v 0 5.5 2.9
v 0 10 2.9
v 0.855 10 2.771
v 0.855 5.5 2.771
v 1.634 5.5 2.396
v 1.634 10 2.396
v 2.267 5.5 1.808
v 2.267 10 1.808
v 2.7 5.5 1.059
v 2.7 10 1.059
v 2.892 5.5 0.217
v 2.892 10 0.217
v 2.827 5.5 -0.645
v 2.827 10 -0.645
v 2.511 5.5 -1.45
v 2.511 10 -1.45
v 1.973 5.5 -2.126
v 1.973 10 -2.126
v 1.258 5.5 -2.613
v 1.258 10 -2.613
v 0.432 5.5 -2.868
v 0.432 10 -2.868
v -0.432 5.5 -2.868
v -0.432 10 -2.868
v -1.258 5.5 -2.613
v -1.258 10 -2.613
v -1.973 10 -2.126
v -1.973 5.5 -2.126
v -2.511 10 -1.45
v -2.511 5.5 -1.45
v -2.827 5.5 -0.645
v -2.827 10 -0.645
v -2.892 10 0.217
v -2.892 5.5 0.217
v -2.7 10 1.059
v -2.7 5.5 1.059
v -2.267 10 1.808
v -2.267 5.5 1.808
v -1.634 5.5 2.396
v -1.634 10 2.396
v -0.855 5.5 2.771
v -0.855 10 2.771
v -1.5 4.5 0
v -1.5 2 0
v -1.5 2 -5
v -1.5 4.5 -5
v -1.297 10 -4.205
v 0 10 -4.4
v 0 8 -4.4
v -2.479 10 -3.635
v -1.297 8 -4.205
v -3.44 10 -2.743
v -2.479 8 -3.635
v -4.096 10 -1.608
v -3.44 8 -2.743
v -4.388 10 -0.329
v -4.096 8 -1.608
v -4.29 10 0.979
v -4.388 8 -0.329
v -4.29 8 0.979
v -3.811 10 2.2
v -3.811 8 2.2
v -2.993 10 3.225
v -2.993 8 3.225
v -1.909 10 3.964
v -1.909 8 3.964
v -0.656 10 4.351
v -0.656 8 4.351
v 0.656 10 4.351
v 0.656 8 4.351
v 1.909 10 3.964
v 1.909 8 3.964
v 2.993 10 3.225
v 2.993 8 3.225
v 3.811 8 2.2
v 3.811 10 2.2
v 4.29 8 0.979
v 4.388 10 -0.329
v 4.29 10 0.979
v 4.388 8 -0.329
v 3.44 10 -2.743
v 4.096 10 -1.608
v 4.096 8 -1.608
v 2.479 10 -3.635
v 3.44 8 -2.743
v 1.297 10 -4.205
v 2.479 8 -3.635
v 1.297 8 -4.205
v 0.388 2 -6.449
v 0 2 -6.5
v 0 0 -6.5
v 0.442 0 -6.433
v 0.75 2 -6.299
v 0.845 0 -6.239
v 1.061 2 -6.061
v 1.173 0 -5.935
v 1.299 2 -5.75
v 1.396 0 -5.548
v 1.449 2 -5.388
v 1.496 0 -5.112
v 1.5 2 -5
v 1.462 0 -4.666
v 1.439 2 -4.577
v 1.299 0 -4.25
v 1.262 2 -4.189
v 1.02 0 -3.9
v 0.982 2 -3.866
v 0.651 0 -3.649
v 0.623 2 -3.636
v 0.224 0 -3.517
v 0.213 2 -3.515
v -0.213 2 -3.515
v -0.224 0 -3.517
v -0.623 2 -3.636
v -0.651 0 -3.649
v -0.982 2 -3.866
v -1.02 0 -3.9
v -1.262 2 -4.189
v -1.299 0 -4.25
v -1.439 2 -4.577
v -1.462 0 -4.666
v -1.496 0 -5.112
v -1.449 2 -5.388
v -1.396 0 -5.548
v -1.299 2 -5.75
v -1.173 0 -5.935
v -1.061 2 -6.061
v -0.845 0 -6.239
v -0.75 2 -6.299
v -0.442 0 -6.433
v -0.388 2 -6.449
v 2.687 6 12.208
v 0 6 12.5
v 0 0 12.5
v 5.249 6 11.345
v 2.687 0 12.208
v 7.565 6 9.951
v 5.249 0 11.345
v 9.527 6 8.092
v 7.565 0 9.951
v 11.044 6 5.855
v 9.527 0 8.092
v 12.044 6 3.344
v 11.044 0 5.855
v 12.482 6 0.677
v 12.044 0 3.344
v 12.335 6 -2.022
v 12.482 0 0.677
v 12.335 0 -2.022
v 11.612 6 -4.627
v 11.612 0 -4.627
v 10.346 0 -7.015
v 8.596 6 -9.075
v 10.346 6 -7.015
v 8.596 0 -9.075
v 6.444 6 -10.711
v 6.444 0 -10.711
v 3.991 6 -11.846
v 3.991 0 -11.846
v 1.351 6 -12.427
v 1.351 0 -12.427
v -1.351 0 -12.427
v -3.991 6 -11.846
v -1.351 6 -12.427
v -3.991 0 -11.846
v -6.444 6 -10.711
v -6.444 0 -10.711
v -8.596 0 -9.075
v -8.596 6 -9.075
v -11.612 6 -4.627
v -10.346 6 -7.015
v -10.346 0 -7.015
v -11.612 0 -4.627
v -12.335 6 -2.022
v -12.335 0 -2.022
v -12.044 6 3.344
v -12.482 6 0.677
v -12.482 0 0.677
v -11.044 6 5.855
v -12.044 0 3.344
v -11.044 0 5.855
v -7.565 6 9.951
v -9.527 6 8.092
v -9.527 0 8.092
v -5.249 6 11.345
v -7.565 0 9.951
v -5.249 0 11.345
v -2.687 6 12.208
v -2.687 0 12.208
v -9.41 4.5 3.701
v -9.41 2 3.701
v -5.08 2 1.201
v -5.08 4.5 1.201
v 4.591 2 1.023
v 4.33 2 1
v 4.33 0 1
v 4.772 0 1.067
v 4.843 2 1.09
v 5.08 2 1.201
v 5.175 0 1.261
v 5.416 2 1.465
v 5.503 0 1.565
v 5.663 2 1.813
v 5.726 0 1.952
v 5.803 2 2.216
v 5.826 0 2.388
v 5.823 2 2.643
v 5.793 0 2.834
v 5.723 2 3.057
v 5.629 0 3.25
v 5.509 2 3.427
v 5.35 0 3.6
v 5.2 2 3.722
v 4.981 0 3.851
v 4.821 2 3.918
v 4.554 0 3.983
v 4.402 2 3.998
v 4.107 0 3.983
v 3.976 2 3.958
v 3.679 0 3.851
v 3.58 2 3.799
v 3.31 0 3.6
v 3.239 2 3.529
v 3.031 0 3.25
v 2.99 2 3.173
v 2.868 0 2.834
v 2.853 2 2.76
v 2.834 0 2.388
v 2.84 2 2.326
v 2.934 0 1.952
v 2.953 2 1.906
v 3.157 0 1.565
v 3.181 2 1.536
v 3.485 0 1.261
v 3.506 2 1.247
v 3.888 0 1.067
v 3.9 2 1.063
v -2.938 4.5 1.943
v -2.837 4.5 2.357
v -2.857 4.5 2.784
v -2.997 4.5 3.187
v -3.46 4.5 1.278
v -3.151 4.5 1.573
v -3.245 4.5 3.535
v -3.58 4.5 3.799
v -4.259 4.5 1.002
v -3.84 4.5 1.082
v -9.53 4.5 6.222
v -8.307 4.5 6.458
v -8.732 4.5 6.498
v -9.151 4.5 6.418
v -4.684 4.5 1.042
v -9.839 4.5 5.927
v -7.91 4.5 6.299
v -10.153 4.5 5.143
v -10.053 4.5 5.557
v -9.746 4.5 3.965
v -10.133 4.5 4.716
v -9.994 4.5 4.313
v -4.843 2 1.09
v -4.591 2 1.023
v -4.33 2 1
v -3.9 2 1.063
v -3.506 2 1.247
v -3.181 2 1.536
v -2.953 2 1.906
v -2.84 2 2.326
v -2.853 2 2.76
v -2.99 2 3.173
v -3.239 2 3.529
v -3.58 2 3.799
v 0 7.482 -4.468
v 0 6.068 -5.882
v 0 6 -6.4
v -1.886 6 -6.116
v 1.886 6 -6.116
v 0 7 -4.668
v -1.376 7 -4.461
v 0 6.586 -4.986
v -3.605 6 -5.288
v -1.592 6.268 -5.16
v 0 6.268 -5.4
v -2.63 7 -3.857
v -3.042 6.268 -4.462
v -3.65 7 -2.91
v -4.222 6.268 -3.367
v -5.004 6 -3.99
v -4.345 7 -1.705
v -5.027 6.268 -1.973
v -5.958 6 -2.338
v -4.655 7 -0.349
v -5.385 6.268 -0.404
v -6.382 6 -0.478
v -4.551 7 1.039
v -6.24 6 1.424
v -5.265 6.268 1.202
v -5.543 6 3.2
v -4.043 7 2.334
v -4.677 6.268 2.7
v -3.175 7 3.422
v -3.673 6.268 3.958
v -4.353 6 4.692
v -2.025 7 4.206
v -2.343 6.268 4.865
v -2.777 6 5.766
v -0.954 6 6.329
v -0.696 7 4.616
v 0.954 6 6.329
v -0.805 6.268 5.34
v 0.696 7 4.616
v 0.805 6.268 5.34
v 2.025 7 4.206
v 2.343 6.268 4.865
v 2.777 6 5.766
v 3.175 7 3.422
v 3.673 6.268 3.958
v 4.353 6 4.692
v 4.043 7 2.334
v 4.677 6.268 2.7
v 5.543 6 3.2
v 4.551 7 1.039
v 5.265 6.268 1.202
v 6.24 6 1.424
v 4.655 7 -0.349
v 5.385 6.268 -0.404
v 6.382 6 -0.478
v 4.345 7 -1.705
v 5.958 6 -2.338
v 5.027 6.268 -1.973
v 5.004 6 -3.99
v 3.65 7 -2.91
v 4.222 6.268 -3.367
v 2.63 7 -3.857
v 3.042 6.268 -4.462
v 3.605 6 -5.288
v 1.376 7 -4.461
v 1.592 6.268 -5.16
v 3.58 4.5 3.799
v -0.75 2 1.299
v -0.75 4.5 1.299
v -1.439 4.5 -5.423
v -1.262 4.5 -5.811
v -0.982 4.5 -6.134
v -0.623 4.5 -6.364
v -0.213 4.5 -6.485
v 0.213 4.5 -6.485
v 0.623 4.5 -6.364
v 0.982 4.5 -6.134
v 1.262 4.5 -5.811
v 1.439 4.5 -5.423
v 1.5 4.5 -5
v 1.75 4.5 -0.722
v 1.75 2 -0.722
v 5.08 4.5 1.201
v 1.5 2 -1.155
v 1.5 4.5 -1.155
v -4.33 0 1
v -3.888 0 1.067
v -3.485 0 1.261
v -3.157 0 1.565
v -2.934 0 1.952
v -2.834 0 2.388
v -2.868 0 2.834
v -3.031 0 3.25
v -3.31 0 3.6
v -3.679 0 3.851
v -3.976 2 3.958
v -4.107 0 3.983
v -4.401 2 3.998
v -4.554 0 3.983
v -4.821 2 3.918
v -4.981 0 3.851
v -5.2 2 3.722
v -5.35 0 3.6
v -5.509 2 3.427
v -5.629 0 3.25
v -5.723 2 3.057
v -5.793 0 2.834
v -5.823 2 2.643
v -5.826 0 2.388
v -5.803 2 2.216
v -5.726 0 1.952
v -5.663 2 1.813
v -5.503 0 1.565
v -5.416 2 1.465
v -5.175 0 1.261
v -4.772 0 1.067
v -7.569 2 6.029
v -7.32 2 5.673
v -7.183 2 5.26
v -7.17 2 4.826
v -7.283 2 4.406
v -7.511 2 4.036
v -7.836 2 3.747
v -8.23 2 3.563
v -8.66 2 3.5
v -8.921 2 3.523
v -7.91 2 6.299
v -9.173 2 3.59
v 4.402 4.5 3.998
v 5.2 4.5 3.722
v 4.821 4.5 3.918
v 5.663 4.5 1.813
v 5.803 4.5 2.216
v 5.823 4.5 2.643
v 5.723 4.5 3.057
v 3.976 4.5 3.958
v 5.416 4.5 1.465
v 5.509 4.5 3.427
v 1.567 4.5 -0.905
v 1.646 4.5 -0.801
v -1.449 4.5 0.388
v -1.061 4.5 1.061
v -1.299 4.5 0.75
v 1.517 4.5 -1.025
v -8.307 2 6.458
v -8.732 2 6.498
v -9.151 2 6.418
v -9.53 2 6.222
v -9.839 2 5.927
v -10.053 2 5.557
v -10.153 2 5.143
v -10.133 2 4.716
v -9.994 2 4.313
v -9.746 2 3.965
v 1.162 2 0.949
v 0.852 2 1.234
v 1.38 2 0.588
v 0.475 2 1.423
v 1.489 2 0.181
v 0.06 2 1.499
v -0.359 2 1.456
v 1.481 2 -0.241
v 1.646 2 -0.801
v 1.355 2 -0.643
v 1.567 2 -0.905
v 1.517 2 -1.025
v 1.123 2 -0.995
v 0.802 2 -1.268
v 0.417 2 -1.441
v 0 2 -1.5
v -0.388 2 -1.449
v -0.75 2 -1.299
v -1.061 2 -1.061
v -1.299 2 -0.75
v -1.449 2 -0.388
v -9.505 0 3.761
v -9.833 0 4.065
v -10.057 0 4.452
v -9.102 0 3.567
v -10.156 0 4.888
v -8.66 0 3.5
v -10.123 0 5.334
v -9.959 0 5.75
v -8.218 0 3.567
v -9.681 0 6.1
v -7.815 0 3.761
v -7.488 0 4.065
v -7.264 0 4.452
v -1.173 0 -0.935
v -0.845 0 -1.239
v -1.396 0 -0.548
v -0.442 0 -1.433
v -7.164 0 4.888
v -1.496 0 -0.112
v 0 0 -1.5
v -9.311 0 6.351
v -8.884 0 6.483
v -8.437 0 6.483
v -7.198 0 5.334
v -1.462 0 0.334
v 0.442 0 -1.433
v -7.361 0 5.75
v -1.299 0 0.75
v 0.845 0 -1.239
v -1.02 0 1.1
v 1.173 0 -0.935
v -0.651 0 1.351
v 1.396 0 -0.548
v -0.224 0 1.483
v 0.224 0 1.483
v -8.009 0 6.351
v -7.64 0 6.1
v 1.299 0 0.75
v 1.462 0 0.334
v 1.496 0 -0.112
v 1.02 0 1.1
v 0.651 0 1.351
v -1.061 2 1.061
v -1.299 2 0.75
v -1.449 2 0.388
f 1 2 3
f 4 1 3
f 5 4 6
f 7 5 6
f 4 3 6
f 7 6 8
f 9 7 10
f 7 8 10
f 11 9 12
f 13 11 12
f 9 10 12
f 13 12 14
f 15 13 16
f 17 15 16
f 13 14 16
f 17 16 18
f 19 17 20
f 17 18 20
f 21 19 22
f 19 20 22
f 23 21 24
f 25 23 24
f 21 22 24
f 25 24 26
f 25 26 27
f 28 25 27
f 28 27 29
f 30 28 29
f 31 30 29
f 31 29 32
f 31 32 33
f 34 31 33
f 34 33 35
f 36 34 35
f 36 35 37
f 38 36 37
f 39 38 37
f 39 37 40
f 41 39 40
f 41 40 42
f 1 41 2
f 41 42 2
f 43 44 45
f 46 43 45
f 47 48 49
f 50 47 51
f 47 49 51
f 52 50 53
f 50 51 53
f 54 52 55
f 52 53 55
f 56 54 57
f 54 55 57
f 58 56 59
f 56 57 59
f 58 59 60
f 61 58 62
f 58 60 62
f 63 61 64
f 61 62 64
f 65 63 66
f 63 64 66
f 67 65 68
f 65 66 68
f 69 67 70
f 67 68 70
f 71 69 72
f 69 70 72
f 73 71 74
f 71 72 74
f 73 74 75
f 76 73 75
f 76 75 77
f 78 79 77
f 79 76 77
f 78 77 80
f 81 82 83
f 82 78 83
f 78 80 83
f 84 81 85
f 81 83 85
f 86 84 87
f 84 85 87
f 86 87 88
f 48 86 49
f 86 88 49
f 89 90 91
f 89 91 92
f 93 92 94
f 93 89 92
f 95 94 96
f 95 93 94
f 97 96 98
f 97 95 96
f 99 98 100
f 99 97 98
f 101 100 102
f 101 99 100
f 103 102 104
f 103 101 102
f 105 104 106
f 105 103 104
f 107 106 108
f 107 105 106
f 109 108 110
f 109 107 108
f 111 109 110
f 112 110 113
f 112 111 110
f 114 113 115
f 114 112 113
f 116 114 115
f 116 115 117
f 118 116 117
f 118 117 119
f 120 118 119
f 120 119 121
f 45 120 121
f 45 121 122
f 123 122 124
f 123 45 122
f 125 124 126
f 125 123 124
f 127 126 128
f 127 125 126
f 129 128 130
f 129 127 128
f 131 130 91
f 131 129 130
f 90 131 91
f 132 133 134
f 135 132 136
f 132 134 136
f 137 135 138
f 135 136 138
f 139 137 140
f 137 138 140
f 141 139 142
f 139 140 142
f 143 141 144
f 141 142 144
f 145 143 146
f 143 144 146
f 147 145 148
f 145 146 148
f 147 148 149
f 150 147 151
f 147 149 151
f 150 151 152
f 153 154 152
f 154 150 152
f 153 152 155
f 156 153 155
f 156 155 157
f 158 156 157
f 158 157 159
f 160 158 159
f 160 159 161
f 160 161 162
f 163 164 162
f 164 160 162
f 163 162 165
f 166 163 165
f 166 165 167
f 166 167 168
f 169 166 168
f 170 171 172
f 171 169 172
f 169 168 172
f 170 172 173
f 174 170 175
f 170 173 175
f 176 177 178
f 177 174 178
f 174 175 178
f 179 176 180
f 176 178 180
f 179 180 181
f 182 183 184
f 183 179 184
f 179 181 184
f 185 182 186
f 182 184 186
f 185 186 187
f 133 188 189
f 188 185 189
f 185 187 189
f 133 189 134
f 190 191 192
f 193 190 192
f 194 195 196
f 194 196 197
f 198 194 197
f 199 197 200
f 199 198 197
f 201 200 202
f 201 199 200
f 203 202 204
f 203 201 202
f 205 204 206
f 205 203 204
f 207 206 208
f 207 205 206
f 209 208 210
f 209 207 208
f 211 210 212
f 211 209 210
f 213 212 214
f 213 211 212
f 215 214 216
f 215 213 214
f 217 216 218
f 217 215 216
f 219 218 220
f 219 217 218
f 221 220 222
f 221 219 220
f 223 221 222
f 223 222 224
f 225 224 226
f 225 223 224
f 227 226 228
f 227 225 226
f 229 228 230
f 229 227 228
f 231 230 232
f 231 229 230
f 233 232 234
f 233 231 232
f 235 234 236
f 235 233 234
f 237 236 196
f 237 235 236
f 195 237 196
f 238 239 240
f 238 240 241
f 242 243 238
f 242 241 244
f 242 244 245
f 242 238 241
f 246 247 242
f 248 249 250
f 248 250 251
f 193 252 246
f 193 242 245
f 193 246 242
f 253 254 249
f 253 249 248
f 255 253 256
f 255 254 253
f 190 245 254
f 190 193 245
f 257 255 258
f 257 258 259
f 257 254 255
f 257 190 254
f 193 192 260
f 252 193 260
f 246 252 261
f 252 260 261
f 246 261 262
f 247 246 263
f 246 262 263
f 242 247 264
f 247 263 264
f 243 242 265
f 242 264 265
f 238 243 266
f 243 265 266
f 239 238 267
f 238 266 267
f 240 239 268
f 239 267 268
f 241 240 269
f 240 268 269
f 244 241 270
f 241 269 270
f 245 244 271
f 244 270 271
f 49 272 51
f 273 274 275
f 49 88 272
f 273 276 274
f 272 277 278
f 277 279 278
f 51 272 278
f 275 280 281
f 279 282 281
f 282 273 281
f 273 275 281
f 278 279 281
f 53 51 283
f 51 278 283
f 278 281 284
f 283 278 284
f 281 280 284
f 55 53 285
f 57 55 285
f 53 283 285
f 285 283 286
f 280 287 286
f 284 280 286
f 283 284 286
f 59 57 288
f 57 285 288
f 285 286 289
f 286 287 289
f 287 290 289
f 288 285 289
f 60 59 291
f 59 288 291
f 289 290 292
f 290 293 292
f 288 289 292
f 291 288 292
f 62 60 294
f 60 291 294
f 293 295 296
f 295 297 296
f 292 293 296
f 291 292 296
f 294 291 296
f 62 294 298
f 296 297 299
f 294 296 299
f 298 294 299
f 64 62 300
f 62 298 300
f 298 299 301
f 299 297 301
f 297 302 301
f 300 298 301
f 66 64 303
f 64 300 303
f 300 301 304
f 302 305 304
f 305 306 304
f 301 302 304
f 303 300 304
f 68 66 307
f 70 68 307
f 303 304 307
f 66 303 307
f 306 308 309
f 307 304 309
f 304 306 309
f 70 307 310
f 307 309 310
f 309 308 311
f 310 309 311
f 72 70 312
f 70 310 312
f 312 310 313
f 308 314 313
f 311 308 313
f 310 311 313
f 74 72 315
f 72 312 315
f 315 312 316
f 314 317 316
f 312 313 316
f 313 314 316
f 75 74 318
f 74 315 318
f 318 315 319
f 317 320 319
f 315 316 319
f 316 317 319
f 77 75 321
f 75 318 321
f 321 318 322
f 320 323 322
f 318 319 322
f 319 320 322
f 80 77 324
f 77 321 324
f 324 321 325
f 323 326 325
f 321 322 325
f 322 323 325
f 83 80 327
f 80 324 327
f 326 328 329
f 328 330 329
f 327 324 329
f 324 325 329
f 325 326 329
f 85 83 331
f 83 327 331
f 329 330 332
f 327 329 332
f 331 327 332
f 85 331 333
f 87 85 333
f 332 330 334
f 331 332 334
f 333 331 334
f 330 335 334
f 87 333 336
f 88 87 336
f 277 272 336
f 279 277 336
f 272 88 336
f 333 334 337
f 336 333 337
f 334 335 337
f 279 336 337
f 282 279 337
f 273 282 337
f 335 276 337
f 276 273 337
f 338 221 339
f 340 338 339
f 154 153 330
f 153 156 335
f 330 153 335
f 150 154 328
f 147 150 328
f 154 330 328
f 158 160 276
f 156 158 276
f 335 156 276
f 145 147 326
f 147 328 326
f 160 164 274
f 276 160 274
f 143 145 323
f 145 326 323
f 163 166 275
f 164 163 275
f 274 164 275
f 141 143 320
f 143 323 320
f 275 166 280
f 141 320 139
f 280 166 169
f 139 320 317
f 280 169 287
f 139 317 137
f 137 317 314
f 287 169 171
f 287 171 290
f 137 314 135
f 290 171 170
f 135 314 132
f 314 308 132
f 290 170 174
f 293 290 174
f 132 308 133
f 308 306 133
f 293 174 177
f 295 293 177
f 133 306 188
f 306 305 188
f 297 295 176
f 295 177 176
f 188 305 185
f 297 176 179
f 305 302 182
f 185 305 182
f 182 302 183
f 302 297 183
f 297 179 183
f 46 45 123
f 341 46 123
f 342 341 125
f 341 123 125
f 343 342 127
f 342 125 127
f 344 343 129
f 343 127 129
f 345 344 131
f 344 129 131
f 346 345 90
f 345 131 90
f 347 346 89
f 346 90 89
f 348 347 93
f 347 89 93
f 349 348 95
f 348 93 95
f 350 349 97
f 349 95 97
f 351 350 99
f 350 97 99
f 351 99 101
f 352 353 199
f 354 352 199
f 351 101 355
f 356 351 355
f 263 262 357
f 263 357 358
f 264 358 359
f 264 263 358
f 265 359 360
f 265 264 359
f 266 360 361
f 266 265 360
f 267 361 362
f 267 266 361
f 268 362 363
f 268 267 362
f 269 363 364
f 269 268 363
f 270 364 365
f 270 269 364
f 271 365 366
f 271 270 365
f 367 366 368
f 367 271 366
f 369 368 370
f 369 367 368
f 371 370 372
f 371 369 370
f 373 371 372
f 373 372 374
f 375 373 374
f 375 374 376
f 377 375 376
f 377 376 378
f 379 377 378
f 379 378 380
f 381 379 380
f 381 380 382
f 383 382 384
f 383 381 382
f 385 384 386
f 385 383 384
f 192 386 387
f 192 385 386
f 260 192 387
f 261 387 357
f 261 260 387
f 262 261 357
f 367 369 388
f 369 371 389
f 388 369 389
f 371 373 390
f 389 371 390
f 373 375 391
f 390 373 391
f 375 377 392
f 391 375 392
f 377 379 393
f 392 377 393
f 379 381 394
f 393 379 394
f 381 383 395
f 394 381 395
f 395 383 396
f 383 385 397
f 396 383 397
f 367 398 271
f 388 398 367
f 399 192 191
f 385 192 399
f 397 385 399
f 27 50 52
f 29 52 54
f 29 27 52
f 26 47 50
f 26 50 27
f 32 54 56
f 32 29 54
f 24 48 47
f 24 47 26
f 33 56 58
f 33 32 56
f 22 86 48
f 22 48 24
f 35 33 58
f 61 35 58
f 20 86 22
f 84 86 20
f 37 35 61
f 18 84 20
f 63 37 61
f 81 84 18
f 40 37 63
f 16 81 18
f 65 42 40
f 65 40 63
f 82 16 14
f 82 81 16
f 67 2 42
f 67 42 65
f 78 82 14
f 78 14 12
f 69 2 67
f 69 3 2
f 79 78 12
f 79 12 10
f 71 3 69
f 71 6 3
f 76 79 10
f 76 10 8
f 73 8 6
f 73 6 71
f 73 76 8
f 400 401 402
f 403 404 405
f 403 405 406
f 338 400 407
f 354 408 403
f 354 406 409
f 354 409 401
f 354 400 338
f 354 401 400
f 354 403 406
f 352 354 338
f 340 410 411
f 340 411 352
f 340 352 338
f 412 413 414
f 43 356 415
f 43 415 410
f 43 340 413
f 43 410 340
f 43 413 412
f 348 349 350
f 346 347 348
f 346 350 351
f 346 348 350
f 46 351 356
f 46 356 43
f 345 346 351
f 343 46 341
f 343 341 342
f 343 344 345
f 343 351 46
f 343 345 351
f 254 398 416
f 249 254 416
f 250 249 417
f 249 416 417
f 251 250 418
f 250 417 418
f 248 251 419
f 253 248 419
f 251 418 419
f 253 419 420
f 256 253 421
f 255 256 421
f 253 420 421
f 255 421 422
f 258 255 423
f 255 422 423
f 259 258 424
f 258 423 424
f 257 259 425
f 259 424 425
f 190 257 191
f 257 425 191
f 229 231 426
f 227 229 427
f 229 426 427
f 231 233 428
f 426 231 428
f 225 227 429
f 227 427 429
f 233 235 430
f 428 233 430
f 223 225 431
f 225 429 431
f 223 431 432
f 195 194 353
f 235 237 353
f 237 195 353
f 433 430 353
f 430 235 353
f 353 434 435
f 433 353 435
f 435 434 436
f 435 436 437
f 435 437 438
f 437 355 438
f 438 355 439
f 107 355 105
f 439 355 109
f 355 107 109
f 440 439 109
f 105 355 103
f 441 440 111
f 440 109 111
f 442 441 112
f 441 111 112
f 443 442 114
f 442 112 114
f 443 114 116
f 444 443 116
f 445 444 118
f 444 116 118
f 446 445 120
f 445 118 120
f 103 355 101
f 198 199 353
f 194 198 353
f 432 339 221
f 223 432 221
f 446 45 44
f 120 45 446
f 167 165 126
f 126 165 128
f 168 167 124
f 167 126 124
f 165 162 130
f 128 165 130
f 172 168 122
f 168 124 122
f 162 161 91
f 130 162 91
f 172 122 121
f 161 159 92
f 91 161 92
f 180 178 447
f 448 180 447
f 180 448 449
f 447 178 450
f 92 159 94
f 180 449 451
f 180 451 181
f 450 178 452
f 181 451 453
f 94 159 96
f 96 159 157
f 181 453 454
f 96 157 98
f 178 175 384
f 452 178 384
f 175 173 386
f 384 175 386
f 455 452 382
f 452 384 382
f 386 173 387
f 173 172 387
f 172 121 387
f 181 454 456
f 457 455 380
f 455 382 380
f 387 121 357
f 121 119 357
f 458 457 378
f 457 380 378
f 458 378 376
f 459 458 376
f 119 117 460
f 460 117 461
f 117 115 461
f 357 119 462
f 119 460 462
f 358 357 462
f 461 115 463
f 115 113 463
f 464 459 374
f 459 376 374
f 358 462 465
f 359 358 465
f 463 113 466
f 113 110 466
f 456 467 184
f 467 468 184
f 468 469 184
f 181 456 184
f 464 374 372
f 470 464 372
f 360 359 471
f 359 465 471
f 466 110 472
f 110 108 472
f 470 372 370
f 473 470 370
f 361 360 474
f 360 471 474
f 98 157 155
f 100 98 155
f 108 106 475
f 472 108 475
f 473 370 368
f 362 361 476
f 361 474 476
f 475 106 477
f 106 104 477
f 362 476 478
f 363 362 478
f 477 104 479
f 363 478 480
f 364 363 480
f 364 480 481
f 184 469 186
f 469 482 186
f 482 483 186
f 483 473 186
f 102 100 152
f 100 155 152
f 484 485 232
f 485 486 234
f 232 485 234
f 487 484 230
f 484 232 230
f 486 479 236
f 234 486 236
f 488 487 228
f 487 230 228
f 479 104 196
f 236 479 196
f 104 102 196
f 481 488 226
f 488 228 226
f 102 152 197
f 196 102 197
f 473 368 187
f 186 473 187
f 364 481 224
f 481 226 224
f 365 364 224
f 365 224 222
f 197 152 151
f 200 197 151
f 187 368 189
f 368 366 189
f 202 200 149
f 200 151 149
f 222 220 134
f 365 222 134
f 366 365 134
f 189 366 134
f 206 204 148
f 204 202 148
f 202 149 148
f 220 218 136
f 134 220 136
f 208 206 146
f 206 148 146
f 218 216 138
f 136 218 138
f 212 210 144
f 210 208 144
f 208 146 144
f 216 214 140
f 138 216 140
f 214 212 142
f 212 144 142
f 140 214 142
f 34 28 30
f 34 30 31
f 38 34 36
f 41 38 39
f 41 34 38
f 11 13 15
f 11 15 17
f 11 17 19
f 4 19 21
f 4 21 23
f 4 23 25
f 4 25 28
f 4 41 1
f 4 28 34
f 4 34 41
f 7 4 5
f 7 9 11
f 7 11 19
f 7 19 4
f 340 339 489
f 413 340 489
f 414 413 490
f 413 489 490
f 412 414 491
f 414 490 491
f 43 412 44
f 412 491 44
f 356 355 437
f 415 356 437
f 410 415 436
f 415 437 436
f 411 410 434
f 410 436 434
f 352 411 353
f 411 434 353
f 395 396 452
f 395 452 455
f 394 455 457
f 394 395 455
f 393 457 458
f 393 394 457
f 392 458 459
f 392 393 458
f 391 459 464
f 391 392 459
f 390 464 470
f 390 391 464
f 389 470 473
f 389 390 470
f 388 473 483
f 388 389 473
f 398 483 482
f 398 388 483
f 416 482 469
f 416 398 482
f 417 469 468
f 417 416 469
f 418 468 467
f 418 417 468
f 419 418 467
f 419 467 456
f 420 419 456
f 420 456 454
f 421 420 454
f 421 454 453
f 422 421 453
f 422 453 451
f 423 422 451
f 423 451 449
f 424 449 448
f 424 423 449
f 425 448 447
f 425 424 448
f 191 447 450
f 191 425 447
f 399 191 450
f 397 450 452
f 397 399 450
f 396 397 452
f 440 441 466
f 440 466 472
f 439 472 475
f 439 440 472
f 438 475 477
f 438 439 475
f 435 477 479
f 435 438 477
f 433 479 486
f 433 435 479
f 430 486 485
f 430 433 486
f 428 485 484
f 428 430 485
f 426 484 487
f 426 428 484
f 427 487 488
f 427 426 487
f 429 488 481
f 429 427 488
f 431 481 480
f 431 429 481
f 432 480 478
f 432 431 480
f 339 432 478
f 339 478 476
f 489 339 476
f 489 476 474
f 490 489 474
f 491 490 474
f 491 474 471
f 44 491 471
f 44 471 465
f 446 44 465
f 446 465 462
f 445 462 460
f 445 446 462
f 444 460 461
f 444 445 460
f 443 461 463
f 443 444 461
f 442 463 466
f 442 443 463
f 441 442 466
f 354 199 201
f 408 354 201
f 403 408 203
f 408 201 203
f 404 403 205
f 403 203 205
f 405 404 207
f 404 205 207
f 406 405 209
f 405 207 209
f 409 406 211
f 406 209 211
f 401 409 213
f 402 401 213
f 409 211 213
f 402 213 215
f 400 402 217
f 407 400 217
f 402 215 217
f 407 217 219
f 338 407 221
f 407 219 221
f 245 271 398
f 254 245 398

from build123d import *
from build123d.topology import SkipClean

# Parameters (mm, degrees)
SKETCH3_R           = 12.5
BOSS_EXTRUDE1_DEPTH = 10
CUT_EXTRUDE3_DEPTH  = 2.5
SKETCH7_R           = 1.500000283
SKETCH7_R_2         = 1.5
CUT_EXTRUDE4_DEPTH  = 20.403607912
SKETCH8_R           = 2.9
CUT_EXTRUDE5_DEPTH  = 4.5


with BuildPart() as part:
    # Sketch3 → Boss-Extrude1 (new body)
    with BuildSketch(Plane(origin=(0, 0, 0), x_dir=(1, 0, 0), z_dir=(0, 1, 0))):
        with Locations(Location((0, 0, 0), (0, 0, 270))):
            Circle(SKETCH3_R)
    extrude(amount=BOSS_EXTRUDE1_DEPTH)

    # Sketch5 → Cut-Extrude3 (cut)
    with BuildSketch(Plane(origin=(0, 2, 0), x_dir=(-1, 0, 0), z_dir=(0, -1, 0))):
        with BuildLine():
            ThreePointArc((7.910254038, -6.299038106), (9.959292144, -5.75), (9.410254038, -3.700961894))
            Line((9.410254038, -3.700961894), (5.080127019, -1.200961894))
            ThreePointArc((5.080127019, -1.200961894), (3.031088913, -1.75), (3.580127019, -3.799038106))
            Line((3.580127019, -3.799038106), (7.910254038, -6.299038106))
        make_face()
        with BuildLine():
            Line((1.5, 0), (1.5, 4.999998598))
            ThreePointArc((1.5, 4.999998598), (0, 6.499998598), (-1.5, 4.999998598))
            Line((-1.5, 4.999998598), (-1.5, 1.154700538))
            ThreePointArc((-1.5, 1.154700538), (-1.566987298, 0.904700538), (-1.75, 0.721687836))
            Line((-1.75, 0.721687836), (-5.080127019, -1.200961894))
            ThreePointArc((-5.080127019, -1.200961894), (-5.629165611, -3.250000029), (-3.580127396, -3.799038324))
            Line((-3.580127396, -3.799038324), (0.75, -1.299038106))
            ThreePointArc((0.75, -1.299038106), (1.299038106, -0.75), (1.5, 0))
        make_face()
    extrude(amount=-CUT_EXTRUDE3_DEPTH, mode=Mode.SUBTRACT)

    # Sketch7 → Cut-Extrude4 (cut, through all)
    with SkipClean():  # the faces are left unmerged after this step: merging them gives an invalid solid
        with BuildSketch(Plane(origin=(0, 2, 0), x_dir=(-1, 0, 0), z_dir=(0, -1, 0))):
            with Locations(Location((0, 4.999998598, 0), (0, 0, 90))):
                Circle(SKETCH7_R)
            with Locations(Location((-4.330127396, -2.500000218, 0), (0, 0, 90))):
                Circle(SKETCH7_R_2)
            with Locations(Location((0, 0, 0), (0, 0, 90))):
                Circle(SKETCH7_R_2)
            with Locations(Location((8.660254038, -5, 0), (0, 0, 90))):
                Circle(SKETCH7_R_2)
            with Locations(Location((4.330127019, -2.5, 0), (0, 0, 90))):
                Circle(SKETCH7_R_2)
        extrude(amount=CUT_EXTRUDE4_DEPTH, mode=Mode.SUBTRACT)

    # Sketch8 → Cut-Extrude5 (cut)
    with SkipClean():  # the faces are left unmerged after this step: merging them gives an invalid solid
        with BuildSketch(Plane(origin=(0, 10, 0), x_dir=(1, 0, 0), z_dir=(0, 1, 0))):
            with Locations(Location((0, 0, 0), (0, 0, 270))):
                Circle(SKETCH8_R)
        extrude(amount=-CUT_EXTRUDE5_DEPTH, mode=Mode.SUBTRACT)

    # Sketch9 → Cut-Revolve1 (revolve, cut)
    with SkipClean():  # the faces are left unmerged after this step: merging them gives an invalid solid
        with BuildSketch(Plane.XY, mode=Mode.PRIVATE) as cut_revolve1_sk:
            with BuildLine():
                Line((21.498533976, 15.074260083), (4.4, 15.074260083))
                Line((4.4, 15.074260083), (4.4, 8))
                ThreePointArc((4.4, 8), (4.985786438, 6.585786438), (6.4, 6))
                Line((6.4, 6), (21.498533976, 6))
                Line((21.498533976, 6), (21.498533976, 15.074260083))
            make_face()
        revolve(cut_revolve1_sk.sketch.rotate(Axis((0, -2.172857957, 0), (0, 1, 0)), 90), axis=Axis((0, -2.172857957, 0), (0, 1, 0)), mode=Mode.SUBTRACT)


solid = part.part
